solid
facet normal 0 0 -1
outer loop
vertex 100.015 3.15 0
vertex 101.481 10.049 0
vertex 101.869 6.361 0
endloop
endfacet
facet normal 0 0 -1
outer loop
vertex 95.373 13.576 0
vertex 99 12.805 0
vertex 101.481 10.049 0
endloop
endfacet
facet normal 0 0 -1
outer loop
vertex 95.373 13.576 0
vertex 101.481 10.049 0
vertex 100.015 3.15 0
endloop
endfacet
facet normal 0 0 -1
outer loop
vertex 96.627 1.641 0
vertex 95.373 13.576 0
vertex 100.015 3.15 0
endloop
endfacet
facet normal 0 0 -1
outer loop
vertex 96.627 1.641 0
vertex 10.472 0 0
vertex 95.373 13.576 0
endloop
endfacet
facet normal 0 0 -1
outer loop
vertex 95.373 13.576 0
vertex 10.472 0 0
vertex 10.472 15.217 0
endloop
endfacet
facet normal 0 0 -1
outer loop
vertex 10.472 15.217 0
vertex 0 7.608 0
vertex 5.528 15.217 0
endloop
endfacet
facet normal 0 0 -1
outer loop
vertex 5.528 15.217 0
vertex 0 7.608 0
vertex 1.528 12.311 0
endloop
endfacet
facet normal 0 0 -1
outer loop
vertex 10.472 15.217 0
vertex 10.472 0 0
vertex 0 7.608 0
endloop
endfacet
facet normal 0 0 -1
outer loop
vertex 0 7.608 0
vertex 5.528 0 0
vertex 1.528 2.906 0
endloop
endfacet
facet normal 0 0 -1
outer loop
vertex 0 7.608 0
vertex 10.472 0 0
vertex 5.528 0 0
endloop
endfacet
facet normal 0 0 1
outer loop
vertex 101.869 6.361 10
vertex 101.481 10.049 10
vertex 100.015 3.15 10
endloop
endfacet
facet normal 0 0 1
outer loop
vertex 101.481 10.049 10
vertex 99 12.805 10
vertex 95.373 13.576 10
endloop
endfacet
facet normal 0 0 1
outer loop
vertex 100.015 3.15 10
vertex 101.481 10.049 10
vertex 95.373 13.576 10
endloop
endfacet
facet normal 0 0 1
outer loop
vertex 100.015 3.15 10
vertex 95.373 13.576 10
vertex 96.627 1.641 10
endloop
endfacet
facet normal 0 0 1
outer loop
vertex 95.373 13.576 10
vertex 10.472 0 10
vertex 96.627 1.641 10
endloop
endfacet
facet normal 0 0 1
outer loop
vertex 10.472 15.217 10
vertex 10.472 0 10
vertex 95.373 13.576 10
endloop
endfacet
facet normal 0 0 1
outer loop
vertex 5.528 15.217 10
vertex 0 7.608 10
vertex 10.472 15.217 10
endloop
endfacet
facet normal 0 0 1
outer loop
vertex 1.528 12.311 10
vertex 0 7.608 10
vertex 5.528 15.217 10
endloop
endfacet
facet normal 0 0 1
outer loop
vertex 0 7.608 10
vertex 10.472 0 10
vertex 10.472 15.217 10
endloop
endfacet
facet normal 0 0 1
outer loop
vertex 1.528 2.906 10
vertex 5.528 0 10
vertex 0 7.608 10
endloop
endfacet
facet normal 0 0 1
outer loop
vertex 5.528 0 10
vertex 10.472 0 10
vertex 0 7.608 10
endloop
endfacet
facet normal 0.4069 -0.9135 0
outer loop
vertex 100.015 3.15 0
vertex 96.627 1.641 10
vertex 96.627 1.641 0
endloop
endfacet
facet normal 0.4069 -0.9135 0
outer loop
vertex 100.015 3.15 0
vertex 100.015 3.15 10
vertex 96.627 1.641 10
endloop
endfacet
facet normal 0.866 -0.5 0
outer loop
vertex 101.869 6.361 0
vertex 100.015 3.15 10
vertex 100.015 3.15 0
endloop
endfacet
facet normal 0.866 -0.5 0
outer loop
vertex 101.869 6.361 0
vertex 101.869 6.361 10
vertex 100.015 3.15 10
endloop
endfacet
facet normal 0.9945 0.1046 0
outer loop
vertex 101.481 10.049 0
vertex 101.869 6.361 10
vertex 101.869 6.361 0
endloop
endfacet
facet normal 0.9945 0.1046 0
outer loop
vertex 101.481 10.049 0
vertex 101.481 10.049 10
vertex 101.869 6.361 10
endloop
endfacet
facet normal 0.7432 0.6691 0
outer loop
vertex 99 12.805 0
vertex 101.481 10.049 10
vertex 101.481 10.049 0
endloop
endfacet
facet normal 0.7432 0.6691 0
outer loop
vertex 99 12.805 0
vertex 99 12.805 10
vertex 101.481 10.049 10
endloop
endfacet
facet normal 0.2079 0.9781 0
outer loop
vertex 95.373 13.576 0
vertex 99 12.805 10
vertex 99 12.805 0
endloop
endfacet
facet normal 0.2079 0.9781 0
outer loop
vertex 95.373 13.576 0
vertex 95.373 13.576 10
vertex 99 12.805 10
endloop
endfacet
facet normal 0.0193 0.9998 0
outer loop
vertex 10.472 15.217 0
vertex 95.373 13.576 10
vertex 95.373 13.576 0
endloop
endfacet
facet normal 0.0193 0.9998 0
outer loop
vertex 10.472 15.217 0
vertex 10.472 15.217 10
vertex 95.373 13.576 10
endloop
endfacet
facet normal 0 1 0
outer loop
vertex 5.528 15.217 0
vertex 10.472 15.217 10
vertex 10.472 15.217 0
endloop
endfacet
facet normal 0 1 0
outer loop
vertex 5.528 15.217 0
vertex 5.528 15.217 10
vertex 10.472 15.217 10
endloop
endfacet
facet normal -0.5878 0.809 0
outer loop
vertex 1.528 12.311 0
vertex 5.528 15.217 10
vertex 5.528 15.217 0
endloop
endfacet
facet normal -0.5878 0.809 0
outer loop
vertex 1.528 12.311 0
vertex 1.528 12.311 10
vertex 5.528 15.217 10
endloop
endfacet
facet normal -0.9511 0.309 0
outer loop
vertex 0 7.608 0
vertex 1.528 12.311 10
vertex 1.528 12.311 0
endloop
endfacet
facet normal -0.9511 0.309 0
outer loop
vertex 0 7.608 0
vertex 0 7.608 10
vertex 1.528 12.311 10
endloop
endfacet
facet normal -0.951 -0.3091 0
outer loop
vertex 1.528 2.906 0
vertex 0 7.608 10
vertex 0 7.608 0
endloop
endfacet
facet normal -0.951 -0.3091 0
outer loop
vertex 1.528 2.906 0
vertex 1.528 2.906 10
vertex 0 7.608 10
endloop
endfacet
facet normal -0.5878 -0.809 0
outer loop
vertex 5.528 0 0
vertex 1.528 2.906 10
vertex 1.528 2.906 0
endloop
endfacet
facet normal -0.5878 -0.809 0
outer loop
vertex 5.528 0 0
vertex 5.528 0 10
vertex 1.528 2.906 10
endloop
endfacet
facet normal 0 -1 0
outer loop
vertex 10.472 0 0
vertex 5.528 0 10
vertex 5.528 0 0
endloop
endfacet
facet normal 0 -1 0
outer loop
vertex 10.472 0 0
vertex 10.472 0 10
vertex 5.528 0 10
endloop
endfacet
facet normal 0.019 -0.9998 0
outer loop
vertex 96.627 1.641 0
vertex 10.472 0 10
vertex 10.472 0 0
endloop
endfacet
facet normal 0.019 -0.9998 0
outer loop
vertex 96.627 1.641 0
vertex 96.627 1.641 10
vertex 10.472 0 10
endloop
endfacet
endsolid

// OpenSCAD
$fn = 32;

// ----------------------------------------------------------------------
// Lever arm: two bosses 16 and 12 mm, 55 mm between centres
// ----------------------------------------------------------------------

// --- parameters (mm) ---
profile_height = 10;      // extrusion height
profile_points = 13;      // points of the closed outline

profile = [[0, 7.608], [1.528, 2.906], [5.528, 0], [10.472, 0], [96.627, 1.641], [100.015, 3.15], [101.869, 6.361], [101.481, 10.049], [99, 12.805], [95.373, 13.576], [10.472, 15.217], [5.528, 15.217], [1.528, 12.311]];  // single closed polygon, 13 points, counter clockwise

// --- the one profile operation ---
linear_extrude(height = profile_height) polygon(points = profile);
